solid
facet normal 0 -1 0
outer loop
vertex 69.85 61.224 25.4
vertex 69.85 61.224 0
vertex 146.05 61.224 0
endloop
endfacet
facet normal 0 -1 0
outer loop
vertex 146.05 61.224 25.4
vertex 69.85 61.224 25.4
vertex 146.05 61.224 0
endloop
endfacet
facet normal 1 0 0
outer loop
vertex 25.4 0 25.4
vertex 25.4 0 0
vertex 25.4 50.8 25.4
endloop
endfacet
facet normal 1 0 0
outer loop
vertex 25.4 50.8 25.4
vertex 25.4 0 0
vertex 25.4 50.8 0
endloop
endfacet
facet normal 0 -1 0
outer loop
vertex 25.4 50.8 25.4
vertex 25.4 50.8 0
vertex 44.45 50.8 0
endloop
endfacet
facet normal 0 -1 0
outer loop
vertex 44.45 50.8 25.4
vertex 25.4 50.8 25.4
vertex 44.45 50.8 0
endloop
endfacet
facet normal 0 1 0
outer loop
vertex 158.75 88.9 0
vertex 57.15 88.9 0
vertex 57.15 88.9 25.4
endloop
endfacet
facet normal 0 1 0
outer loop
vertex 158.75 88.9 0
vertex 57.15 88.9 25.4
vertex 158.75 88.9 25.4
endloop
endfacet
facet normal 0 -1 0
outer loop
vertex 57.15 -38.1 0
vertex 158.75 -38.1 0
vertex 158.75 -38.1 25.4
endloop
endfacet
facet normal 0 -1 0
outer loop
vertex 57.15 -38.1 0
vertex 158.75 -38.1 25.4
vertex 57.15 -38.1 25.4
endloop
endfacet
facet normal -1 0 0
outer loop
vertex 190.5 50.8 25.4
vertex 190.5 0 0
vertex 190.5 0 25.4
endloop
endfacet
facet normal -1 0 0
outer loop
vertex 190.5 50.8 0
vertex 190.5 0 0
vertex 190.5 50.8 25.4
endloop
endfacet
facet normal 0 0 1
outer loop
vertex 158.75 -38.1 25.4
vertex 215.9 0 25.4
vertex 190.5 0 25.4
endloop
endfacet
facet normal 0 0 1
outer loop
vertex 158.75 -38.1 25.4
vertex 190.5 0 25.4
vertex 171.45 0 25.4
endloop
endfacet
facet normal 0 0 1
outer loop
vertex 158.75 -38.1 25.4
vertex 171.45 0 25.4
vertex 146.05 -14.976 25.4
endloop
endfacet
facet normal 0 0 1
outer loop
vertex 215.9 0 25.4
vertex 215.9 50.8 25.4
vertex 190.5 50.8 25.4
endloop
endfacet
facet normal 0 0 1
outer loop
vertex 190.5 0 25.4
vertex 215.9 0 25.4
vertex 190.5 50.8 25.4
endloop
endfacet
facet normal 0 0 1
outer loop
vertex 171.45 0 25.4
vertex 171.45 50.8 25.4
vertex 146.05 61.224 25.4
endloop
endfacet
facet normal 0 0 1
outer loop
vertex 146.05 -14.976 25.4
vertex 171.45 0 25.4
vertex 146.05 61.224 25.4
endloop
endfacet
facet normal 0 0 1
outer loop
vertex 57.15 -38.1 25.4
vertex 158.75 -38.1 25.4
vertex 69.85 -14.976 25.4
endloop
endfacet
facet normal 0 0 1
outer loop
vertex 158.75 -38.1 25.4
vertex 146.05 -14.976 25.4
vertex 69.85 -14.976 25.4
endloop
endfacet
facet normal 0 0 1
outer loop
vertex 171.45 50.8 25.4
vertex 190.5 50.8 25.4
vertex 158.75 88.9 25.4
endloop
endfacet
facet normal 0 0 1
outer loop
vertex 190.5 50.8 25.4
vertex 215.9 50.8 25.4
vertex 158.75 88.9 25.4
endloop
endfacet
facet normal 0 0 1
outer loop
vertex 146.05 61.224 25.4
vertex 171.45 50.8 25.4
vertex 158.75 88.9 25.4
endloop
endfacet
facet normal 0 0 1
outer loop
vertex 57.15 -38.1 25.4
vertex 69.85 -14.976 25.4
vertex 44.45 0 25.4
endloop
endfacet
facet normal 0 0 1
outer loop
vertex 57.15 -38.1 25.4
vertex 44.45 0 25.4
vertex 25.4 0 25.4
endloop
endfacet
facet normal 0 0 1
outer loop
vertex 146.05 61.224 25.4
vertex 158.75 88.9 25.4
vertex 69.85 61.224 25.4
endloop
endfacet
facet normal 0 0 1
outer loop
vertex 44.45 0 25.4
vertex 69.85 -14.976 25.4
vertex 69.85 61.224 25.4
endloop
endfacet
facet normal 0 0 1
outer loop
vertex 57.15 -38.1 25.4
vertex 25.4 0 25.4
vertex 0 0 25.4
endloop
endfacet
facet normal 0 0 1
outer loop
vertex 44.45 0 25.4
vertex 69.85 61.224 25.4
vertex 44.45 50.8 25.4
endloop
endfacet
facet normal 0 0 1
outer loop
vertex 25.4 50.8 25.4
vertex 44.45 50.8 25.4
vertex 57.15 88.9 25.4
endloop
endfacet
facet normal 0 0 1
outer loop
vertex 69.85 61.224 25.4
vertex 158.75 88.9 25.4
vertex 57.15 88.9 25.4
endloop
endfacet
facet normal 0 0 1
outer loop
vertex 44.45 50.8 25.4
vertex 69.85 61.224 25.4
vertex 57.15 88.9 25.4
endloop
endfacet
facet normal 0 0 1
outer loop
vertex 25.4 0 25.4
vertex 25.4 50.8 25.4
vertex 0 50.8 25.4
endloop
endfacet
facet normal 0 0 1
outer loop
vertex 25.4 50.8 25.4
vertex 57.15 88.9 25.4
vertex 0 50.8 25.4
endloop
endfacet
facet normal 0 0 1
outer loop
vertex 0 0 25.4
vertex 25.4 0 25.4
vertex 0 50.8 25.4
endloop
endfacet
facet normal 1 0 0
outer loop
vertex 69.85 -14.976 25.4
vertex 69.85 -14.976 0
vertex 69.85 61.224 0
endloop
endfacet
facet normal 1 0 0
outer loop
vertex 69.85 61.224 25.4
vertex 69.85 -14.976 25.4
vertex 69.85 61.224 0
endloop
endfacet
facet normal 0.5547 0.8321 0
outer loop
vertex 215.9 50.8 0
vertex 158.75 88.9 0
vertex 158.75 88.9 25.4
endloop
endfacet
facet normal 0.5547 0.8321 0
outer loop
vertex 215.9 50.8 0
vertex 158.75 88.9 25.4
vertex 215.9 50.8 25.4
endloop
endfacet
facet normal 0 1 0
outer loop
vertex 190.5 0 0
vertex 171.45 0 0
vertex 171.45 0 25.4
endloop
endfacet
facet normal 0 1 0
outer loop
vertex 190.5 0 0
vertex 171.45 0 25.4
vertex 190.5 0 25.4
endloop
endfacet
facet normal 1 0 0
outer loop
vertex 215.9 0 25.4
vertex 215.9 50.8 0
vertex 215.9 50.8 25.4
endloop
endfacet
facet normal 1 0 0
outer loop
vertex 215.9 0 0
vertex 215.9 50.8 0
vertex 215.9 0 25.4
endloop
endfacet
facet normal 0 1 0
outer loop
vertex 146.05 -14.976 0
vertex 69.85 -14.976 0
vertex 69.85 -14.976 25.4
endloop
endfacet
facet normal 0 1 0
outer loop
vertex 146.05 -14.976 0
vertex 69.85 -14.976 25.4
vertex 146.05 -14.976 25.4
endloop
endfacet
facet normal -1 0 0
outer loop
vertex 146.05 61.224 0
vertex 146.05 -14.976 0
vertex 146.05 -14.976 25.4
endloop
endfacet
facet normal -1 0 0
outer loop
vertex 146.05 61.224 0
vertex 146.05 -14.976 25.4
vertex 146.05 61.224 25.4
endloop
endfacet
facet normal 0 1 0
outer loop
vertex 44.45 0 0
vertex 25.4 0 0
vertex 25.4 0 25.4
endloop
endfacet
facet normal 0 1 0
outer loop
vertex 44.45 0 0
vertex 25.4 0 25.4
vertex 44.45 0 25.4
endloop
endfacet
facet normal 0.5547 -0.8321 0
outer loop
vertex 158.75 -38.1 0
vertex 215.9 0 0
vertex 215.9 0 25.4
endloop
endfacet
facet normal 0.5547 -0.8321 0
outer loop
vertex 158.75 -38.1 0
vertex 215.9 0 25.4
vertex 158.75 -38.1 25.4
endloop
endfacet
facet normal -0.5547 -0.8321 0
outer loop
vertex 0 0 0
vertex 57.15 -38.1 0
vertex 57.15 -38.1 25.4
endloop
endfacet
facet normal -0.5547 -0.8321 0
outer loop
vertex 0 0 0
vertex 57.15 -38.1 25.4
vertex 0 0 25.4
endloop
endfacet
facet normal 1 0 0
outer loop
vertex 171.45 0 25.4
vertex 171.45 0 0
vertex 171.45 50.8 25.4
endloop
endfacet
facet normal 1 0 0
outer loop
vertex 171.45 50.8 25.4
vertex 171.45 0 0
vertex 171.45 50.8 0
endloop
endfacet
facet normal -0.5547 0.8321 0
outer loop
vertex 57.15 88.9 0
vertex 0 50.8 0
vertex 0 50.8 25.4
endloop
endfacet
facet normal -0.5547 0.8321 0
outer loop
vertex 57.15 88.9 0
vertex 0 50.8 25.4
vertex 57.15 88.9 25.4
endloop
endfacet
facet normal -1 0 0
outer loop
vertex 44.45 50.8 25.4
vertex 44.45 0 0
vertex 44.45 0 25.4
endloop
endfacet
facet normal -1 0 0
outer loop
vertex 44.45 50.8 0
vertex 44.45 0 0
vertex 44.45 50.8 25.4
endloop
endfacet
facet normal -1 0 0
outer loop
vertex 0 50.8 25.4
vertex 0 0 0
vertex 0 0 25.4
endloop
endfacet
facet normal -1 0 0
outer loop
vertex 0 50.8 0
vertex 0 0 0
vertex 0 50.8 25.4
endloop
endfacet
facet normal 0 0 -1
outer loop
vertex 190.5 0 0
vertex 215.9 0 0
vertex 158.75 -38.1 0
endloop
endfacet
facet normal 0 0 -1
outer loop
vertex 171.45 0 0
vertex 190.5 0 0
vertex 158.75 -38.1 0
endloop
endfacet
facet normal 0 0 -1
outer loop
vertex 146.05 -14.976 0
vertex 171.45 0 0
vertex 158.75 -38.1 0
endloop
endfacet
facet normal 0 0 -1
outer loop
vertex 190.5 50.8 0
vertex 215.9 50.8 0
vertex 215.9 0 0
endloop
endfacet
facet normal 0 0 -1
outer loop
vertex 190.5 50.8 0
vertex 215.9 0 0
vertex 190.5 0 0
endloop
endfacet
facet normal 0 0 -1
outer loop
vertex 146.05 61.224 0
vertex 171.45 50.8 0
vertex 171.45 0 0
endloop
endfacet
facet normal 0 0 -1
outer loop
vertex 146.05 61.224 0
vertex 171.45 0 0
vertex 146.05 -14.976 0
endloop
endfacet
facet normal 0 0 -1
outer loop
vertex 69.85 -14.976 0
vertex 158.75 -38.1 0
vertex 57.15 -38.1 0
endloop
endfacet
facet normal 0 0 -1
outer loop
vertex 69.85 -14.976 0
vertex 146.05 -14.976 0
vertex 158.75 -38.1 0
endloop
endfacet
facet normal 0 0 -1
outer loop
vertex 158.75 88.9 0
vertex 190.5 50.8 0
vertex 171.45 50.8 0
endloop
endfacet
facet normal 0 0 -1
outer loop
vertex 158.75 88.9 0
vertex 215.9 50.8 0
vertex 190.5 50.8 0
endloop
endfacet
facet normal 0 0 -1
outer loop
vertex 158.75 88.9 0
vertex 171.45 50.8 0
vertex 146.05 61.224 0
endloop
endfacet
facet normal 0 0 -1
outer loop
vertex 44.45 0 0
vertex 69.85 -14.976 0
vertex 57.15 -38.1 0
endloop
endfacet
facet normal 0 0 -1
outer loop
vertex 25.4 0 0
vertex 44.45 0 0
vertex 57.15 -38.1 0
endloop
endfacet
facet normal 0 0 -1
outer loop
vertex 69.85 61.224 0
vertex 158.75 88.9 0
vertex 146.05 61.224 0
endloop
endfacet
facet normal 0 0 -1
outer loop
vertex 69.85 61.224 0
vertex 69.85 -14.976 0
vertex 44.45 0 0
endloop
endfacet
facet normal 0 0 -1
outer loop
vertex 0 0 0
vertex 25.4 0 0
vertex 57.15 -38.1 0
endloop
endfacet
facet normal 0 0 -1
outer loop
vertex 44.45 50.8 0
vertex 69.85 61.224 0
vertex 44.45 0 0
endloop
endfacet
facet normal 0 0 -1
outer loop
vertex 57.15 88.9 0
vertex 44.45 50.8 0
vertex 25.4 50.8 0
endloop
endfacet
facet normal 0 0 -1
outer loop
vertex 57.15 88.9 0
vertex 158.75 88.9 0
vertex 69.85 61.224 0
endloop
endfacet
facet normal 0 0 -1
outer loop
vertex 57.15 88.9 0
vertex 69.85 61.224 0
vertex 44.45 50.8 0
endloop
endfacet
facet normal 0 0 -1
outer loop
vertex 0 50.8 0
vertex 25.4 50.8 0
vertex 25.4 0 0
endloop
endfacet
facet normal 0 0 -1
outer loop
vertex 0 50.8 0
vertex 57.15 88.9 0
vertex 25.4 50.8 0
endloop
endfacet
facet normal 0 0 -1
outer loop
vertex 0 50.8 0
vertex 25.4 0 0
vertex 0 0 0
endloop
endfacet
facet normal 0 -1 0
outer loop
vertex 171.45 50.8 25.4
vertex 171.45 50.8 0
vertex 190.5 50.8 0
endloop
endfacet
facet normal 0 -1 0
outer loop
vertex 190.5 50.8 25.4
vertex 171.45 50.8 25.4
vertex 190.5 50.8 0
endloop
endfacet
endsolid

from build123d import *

# Parameters (mm, degrees)
SKETCH1_W           = 19.05
SKETCH1_H           = 50.8
SKETCH1_W_2         = 76.2
SKETCH1_H_2         = 76.2
BOSS_EXTRUDE1_DEPTH = 25.4


with BuildPart() as part:
    # Sketch1 → Boss-Extrude1 (new body)
    with BuildSketch(Plane.XY):
        Polygon((0, 0), (0, 50.8), (57.15, 88.9), (158.75, 88.9), (215.9, 50.8), (215.9, 0), (158.75, -38.1), (57.15, -38.1), align=None)
        with Locations((34.925, 25.4)):
            Rectangle(SKETCH1_W, SKETCH1_H, mode=Mode.SUBTRACT)
        with Locations((107.95, 23.124358826)):
            Rectangle(SKETCH1_W_2, SKETCH1_H_2, mode=Mode.SUBTRACT)
        with Locations((180.975, 25.4)):
            Rectangle(SKETCH1_W, SKETCH1_H, mode=Mode.SUBTRACT)
    extrude(amount=BOSS_EXTRUDE1_DEPTH)


solid = part.part
